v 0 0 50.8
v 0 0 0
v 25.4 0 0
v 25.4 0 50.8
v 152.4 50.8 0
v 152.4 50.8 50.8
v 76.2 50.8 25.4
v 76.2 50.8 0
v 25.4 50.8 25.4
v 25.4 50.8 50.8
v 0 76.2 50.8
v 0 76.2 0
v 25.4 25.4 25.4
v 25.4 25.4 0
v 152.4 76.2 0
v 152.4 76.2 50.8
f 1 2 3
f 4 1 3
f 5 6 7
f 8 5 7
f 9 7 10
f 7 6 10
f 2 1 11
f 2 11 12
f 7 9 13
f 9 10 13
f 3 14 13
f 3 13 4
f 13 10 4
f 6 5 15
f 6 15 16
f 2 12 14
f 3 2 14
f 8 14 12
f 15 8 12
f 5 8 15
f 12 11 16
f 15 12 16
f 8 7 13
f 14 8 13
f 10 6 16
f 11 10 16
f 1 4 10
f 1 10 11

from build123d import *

# Parameters (mm, degrees)
F0_W     = 50.8
F0_H     = 25.4
F1_DEPTH = 76.2
F3_DEPTH = 76.2
F5_DEPTH = 25.4


with BuildPart() as f1:
    # F0 (on Front) → F1 (new body)
    with BuildSketch(Plane.XZ):
        Polygon((0, 50.8), (0, 0), (25.4, 0), (25.4, 25.4), (25.4, 50.8), align=None)
        Polygon((152.4, 50.8), (25.4, 50.8), (25.4, 25.4), (76.2, 25.4), (76.2, 0), (152.4, 0), align=None)
        with Locations((50.8, 12.7)):
            Rectangle(F0_W, F0_H)
    extrude(amount=-F1_DEPTH)

    # F2 (on face) → F3 (cut)
    with BuildSketch(Plane.XY.offset(50.8)):
        Polygon((152.4, 0), (152.4, 50.8), (76.2, 50.8), (25.4, 25.4), (25.4, 0), align=None)
    extrude(amount=-F3_DEPTH, mode=Mode.SUBTRACT)

    # F4 (on face) → F5 (cut)
    with BuildSketch(Plane.XY.offset(50.8)):
        Polygon((25.4, 50.8), (25.4, 25.4), (76.2, 50.8), align=None)
    extrude(amount=-F5_DEPTH, mode=Mode.SUBTRACT)


solid = f1.part
